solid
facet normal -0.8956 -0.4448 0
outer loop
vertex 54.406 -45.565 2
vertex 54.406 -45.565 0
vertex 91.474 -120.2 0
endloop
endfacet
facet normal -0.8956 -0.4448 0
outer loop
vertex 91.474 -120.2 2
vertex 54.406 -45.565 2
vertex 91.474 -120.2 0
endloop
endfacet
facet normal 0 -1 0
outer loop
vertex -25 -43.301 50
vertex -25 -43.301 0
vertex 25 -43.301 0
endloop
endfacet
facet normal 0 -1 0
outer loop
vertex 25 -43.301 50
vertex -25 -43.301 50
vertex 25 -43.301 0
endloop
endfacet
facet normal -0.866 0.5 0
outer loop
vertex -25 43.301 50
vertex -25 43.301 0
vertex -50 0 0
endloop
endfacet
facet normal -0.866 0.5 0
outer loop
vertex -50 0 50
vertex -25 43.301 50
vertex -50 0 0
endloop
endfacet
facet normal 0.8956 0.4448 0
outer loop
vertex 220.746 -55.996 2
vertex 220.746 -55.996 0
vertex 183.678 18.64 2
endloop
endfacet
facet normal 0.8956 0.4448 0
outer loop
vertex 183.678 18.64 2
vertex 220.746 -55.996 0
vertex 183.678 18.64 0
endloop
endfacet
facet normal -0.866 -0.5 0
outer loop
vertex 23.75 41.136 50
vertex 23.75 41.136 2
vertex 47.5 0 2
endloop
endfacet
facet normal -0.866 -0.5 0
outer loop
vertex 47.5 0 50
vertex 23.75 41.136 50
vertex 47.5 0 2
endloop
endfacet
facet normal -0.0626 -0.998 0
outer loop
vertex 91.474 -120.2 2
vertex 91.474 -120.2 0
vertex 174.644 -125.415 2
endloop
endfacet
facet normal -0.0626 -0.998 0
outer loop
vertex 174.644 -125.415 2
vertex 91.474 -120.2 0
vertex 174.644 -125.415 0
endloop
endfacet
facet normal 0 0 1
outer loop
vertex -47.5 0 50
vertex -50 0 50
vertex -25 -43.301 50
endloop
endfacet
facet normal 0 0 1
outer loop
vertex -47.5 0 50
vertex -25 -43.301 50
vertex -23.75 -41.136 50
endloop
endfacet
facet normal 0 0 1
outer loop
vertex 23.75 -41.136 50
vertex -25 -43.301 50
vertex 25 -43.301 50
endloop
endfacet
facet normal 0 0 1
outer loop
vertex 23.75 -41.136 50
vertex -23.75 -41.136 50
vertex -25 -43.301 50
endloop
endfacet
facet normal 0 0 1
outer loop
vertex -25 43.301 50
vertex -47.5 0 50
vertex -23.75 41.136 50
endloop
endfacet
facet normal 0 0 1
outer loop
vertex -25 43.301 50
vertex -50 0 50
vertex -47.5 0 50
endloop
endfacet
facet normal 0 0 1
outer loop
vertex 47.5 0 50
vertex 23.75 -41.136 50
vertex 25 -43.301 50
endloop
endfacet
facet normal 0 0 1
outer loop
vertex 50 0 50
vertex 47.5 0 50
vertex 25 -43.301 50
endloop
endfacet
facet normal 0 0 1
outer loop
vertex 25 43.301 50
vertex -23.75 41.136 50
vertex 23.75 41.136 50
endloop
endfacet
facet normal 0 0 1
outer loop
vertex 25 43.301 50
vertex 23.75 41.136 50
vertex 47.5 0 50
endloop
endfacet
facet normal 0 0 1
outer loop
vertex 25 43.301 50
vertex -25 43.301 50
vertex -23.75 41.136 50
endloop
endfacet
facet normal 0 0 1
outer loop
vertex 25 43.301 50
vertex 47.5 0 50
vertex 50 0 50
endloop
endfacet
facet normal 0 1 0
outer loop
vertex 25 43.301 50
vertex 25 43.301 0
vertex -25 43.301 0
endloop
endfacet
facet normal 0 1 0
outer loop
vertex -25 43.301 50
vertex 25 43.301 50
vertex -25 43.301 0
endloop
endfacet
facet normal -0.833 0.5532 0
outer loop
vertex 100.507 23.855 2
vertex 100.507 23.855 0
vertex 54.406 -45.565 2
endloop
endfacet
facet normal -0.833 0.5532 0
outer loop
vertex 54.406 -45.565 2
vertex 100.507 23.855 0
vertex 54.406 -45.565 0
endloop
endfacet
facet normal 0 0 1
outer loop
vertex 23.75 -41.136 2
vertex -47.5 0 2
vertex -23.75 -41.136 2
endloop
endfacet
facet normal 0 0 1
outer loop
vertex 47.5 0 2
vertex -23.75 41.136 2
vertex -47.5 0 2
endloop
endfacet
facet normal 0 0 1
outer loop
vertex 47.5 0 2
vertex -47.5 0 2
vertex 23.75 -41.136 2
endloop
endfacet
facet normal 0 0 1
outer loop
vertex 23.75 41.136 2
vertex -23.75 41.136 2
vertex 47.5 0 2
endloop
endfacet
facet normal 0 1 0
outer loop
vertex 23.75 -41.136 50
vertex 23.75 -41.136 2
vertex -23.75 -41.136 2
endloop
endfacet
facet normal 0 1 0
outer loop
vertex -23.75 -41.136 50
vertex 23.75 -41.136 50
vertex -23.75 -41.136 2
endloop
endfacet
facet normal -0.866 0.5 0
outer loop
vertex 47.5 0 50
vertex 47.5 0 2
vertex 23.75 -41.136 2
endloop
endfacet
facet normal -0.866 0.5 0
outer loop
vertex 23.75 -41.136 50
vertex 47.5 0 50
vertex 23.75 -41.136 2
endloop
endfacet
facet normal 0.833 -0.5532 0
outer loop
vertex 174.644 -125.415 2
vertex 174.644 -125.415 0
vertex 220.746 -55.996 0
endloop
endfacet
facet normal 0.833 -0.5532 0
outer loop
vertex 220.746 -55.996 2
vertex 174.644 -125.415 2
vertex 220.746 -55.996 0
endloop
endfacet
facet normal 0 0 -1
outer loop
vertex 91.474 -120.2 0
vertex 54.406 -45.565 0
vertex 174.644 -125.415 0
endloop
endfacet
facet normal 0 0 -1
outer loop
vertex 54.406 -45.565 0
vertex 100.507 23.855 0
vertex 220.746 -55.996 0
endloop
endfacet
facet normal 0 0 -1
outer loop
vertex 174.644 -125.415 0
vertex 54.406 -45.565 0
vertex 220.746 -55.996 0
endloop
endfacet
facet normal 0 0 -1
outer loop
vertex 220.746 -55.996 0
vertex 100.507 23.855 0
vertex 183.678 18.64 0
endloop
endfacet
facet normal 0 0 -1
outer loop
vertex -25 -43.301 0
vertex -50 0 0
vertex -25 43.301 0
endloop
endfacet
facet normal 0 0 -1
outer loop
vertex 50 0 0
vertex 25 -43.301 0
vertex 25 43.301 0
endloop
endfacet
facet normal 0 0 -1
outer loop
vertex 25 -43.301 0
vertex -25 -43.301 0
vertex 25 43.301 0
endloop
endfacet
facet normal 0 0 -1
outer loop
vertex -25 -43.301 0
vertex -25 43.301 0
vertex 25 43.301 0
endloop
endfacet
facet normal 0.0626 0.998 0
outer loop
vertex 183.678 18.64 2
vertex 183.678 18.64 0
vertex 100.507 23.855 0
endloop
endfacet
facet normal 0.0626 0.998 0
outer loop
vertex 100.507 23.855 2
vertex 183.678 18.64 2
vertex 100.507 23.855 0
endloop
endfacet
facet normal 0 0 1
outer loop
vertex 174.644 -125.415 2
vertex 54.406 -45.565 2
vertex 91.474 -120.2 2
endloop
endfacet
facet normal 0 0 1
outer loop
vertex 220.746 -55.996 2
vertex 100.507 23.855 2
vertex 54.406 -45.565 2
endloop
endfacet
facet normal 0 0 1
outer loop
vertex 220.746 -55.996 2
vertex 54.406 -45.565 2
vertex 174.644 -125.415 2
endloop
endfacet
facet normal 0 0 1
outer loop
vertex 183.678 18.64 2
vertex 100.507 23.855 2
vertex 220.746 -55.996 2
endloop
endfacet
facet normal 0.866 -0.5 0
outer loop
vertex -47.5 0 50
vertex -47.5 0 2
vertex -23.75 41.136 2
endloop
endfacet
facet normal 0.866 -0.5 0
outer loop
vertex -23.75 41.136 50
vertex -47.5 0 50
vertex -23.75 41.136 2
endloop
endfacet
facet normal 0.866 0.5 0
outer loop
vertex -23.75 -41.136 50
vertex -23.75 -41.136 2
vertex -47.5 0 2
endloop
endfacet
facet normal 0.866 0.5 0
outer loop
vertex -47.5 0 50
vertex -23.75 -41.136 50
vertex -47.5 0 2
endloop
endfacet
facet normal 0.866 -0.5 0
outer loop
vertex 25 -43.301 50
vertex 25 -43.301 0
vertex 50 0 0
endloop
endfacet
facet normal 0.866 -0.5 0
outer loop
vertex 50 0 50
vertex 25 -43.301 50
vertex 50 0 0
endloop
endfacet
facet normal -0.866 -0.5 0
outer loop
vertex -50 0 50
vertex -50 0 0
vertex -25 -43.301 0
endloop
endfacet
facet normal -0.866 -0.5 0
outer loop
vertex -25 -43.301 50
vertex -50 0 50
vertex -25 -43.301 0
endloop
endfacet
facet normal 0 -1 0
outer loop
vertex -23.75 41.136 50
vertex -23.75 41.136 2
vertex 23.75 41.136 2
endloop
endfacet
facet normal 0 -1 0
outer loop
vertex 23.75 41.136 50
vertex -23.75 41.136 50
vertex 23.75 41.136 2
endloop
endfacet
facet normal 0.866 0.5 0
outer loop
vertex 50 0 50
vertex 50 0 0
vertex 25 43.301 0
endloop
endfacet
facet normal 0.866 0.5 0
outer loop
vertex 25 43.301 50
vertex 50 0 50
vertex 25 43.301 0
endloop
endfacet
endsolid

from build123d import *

# Parameters (mm, degrees)
F1_DEPTH = 2
F2_DEPTH = 50
F4_DEPTH = 2


with BuildPart() as f1:
    # F0 (on Top) → F1 (new body)
    with BuildSketch(Plane.XY):
        Polygon((25, -43.30127), (50, 0), (25, 43.30127), (-25, 43.30127), (-50, 0), (-25, -43.30127), align=None)
        Polygon((-47.5, 0), (-23.75, 41.136207), (23.75, 41.136207), (47.5, 0), (23.75, -41.136207), (-23.75, -41.136207), align=None, mode=Mode.SUBTRACT)
        Polygon((23.75, 41.136207), (-23.75, 41.136207), (-47.5, 0), (-23.75, -41.136207), (23.75, -41.136207), (47.5, 0), align=None)
    extrude(amount=F1_DEPTH)

    # F0 (on Top) → F2 (join)
    with BuildSketch(Plane.XY):
        Polygon((25, -43.30127), (50, 0), (25, 43.30127), (-25, 43.30127), (-50, 0), (-25, -43.30127), align=None)
        Polygon((-47.5, 0), (-23.75, 41.136207), (23.75, 41.136207), (47.5, 0), (23.75, -41.136207), (-23.75, -41.136207), align=None, mode=Mode.SUBTRACT)
    extrude(amount=F2_DEPTH)


with BuildPart() as f4:
    # F3 (on Top) → F4 (new body)
    with BuildSketch(Plane.XY):
        Polygon((174.644096, -125.415403), (220.745932, -55.995704), (183.677628, 18.639507), (100.507488, 23.855019), (54.405651, -45.56468), (91.473955, -120.199891), align=None)
    extrude(amount=F4_DEPTH)


solid = Compound([f1.part, f4.part])
